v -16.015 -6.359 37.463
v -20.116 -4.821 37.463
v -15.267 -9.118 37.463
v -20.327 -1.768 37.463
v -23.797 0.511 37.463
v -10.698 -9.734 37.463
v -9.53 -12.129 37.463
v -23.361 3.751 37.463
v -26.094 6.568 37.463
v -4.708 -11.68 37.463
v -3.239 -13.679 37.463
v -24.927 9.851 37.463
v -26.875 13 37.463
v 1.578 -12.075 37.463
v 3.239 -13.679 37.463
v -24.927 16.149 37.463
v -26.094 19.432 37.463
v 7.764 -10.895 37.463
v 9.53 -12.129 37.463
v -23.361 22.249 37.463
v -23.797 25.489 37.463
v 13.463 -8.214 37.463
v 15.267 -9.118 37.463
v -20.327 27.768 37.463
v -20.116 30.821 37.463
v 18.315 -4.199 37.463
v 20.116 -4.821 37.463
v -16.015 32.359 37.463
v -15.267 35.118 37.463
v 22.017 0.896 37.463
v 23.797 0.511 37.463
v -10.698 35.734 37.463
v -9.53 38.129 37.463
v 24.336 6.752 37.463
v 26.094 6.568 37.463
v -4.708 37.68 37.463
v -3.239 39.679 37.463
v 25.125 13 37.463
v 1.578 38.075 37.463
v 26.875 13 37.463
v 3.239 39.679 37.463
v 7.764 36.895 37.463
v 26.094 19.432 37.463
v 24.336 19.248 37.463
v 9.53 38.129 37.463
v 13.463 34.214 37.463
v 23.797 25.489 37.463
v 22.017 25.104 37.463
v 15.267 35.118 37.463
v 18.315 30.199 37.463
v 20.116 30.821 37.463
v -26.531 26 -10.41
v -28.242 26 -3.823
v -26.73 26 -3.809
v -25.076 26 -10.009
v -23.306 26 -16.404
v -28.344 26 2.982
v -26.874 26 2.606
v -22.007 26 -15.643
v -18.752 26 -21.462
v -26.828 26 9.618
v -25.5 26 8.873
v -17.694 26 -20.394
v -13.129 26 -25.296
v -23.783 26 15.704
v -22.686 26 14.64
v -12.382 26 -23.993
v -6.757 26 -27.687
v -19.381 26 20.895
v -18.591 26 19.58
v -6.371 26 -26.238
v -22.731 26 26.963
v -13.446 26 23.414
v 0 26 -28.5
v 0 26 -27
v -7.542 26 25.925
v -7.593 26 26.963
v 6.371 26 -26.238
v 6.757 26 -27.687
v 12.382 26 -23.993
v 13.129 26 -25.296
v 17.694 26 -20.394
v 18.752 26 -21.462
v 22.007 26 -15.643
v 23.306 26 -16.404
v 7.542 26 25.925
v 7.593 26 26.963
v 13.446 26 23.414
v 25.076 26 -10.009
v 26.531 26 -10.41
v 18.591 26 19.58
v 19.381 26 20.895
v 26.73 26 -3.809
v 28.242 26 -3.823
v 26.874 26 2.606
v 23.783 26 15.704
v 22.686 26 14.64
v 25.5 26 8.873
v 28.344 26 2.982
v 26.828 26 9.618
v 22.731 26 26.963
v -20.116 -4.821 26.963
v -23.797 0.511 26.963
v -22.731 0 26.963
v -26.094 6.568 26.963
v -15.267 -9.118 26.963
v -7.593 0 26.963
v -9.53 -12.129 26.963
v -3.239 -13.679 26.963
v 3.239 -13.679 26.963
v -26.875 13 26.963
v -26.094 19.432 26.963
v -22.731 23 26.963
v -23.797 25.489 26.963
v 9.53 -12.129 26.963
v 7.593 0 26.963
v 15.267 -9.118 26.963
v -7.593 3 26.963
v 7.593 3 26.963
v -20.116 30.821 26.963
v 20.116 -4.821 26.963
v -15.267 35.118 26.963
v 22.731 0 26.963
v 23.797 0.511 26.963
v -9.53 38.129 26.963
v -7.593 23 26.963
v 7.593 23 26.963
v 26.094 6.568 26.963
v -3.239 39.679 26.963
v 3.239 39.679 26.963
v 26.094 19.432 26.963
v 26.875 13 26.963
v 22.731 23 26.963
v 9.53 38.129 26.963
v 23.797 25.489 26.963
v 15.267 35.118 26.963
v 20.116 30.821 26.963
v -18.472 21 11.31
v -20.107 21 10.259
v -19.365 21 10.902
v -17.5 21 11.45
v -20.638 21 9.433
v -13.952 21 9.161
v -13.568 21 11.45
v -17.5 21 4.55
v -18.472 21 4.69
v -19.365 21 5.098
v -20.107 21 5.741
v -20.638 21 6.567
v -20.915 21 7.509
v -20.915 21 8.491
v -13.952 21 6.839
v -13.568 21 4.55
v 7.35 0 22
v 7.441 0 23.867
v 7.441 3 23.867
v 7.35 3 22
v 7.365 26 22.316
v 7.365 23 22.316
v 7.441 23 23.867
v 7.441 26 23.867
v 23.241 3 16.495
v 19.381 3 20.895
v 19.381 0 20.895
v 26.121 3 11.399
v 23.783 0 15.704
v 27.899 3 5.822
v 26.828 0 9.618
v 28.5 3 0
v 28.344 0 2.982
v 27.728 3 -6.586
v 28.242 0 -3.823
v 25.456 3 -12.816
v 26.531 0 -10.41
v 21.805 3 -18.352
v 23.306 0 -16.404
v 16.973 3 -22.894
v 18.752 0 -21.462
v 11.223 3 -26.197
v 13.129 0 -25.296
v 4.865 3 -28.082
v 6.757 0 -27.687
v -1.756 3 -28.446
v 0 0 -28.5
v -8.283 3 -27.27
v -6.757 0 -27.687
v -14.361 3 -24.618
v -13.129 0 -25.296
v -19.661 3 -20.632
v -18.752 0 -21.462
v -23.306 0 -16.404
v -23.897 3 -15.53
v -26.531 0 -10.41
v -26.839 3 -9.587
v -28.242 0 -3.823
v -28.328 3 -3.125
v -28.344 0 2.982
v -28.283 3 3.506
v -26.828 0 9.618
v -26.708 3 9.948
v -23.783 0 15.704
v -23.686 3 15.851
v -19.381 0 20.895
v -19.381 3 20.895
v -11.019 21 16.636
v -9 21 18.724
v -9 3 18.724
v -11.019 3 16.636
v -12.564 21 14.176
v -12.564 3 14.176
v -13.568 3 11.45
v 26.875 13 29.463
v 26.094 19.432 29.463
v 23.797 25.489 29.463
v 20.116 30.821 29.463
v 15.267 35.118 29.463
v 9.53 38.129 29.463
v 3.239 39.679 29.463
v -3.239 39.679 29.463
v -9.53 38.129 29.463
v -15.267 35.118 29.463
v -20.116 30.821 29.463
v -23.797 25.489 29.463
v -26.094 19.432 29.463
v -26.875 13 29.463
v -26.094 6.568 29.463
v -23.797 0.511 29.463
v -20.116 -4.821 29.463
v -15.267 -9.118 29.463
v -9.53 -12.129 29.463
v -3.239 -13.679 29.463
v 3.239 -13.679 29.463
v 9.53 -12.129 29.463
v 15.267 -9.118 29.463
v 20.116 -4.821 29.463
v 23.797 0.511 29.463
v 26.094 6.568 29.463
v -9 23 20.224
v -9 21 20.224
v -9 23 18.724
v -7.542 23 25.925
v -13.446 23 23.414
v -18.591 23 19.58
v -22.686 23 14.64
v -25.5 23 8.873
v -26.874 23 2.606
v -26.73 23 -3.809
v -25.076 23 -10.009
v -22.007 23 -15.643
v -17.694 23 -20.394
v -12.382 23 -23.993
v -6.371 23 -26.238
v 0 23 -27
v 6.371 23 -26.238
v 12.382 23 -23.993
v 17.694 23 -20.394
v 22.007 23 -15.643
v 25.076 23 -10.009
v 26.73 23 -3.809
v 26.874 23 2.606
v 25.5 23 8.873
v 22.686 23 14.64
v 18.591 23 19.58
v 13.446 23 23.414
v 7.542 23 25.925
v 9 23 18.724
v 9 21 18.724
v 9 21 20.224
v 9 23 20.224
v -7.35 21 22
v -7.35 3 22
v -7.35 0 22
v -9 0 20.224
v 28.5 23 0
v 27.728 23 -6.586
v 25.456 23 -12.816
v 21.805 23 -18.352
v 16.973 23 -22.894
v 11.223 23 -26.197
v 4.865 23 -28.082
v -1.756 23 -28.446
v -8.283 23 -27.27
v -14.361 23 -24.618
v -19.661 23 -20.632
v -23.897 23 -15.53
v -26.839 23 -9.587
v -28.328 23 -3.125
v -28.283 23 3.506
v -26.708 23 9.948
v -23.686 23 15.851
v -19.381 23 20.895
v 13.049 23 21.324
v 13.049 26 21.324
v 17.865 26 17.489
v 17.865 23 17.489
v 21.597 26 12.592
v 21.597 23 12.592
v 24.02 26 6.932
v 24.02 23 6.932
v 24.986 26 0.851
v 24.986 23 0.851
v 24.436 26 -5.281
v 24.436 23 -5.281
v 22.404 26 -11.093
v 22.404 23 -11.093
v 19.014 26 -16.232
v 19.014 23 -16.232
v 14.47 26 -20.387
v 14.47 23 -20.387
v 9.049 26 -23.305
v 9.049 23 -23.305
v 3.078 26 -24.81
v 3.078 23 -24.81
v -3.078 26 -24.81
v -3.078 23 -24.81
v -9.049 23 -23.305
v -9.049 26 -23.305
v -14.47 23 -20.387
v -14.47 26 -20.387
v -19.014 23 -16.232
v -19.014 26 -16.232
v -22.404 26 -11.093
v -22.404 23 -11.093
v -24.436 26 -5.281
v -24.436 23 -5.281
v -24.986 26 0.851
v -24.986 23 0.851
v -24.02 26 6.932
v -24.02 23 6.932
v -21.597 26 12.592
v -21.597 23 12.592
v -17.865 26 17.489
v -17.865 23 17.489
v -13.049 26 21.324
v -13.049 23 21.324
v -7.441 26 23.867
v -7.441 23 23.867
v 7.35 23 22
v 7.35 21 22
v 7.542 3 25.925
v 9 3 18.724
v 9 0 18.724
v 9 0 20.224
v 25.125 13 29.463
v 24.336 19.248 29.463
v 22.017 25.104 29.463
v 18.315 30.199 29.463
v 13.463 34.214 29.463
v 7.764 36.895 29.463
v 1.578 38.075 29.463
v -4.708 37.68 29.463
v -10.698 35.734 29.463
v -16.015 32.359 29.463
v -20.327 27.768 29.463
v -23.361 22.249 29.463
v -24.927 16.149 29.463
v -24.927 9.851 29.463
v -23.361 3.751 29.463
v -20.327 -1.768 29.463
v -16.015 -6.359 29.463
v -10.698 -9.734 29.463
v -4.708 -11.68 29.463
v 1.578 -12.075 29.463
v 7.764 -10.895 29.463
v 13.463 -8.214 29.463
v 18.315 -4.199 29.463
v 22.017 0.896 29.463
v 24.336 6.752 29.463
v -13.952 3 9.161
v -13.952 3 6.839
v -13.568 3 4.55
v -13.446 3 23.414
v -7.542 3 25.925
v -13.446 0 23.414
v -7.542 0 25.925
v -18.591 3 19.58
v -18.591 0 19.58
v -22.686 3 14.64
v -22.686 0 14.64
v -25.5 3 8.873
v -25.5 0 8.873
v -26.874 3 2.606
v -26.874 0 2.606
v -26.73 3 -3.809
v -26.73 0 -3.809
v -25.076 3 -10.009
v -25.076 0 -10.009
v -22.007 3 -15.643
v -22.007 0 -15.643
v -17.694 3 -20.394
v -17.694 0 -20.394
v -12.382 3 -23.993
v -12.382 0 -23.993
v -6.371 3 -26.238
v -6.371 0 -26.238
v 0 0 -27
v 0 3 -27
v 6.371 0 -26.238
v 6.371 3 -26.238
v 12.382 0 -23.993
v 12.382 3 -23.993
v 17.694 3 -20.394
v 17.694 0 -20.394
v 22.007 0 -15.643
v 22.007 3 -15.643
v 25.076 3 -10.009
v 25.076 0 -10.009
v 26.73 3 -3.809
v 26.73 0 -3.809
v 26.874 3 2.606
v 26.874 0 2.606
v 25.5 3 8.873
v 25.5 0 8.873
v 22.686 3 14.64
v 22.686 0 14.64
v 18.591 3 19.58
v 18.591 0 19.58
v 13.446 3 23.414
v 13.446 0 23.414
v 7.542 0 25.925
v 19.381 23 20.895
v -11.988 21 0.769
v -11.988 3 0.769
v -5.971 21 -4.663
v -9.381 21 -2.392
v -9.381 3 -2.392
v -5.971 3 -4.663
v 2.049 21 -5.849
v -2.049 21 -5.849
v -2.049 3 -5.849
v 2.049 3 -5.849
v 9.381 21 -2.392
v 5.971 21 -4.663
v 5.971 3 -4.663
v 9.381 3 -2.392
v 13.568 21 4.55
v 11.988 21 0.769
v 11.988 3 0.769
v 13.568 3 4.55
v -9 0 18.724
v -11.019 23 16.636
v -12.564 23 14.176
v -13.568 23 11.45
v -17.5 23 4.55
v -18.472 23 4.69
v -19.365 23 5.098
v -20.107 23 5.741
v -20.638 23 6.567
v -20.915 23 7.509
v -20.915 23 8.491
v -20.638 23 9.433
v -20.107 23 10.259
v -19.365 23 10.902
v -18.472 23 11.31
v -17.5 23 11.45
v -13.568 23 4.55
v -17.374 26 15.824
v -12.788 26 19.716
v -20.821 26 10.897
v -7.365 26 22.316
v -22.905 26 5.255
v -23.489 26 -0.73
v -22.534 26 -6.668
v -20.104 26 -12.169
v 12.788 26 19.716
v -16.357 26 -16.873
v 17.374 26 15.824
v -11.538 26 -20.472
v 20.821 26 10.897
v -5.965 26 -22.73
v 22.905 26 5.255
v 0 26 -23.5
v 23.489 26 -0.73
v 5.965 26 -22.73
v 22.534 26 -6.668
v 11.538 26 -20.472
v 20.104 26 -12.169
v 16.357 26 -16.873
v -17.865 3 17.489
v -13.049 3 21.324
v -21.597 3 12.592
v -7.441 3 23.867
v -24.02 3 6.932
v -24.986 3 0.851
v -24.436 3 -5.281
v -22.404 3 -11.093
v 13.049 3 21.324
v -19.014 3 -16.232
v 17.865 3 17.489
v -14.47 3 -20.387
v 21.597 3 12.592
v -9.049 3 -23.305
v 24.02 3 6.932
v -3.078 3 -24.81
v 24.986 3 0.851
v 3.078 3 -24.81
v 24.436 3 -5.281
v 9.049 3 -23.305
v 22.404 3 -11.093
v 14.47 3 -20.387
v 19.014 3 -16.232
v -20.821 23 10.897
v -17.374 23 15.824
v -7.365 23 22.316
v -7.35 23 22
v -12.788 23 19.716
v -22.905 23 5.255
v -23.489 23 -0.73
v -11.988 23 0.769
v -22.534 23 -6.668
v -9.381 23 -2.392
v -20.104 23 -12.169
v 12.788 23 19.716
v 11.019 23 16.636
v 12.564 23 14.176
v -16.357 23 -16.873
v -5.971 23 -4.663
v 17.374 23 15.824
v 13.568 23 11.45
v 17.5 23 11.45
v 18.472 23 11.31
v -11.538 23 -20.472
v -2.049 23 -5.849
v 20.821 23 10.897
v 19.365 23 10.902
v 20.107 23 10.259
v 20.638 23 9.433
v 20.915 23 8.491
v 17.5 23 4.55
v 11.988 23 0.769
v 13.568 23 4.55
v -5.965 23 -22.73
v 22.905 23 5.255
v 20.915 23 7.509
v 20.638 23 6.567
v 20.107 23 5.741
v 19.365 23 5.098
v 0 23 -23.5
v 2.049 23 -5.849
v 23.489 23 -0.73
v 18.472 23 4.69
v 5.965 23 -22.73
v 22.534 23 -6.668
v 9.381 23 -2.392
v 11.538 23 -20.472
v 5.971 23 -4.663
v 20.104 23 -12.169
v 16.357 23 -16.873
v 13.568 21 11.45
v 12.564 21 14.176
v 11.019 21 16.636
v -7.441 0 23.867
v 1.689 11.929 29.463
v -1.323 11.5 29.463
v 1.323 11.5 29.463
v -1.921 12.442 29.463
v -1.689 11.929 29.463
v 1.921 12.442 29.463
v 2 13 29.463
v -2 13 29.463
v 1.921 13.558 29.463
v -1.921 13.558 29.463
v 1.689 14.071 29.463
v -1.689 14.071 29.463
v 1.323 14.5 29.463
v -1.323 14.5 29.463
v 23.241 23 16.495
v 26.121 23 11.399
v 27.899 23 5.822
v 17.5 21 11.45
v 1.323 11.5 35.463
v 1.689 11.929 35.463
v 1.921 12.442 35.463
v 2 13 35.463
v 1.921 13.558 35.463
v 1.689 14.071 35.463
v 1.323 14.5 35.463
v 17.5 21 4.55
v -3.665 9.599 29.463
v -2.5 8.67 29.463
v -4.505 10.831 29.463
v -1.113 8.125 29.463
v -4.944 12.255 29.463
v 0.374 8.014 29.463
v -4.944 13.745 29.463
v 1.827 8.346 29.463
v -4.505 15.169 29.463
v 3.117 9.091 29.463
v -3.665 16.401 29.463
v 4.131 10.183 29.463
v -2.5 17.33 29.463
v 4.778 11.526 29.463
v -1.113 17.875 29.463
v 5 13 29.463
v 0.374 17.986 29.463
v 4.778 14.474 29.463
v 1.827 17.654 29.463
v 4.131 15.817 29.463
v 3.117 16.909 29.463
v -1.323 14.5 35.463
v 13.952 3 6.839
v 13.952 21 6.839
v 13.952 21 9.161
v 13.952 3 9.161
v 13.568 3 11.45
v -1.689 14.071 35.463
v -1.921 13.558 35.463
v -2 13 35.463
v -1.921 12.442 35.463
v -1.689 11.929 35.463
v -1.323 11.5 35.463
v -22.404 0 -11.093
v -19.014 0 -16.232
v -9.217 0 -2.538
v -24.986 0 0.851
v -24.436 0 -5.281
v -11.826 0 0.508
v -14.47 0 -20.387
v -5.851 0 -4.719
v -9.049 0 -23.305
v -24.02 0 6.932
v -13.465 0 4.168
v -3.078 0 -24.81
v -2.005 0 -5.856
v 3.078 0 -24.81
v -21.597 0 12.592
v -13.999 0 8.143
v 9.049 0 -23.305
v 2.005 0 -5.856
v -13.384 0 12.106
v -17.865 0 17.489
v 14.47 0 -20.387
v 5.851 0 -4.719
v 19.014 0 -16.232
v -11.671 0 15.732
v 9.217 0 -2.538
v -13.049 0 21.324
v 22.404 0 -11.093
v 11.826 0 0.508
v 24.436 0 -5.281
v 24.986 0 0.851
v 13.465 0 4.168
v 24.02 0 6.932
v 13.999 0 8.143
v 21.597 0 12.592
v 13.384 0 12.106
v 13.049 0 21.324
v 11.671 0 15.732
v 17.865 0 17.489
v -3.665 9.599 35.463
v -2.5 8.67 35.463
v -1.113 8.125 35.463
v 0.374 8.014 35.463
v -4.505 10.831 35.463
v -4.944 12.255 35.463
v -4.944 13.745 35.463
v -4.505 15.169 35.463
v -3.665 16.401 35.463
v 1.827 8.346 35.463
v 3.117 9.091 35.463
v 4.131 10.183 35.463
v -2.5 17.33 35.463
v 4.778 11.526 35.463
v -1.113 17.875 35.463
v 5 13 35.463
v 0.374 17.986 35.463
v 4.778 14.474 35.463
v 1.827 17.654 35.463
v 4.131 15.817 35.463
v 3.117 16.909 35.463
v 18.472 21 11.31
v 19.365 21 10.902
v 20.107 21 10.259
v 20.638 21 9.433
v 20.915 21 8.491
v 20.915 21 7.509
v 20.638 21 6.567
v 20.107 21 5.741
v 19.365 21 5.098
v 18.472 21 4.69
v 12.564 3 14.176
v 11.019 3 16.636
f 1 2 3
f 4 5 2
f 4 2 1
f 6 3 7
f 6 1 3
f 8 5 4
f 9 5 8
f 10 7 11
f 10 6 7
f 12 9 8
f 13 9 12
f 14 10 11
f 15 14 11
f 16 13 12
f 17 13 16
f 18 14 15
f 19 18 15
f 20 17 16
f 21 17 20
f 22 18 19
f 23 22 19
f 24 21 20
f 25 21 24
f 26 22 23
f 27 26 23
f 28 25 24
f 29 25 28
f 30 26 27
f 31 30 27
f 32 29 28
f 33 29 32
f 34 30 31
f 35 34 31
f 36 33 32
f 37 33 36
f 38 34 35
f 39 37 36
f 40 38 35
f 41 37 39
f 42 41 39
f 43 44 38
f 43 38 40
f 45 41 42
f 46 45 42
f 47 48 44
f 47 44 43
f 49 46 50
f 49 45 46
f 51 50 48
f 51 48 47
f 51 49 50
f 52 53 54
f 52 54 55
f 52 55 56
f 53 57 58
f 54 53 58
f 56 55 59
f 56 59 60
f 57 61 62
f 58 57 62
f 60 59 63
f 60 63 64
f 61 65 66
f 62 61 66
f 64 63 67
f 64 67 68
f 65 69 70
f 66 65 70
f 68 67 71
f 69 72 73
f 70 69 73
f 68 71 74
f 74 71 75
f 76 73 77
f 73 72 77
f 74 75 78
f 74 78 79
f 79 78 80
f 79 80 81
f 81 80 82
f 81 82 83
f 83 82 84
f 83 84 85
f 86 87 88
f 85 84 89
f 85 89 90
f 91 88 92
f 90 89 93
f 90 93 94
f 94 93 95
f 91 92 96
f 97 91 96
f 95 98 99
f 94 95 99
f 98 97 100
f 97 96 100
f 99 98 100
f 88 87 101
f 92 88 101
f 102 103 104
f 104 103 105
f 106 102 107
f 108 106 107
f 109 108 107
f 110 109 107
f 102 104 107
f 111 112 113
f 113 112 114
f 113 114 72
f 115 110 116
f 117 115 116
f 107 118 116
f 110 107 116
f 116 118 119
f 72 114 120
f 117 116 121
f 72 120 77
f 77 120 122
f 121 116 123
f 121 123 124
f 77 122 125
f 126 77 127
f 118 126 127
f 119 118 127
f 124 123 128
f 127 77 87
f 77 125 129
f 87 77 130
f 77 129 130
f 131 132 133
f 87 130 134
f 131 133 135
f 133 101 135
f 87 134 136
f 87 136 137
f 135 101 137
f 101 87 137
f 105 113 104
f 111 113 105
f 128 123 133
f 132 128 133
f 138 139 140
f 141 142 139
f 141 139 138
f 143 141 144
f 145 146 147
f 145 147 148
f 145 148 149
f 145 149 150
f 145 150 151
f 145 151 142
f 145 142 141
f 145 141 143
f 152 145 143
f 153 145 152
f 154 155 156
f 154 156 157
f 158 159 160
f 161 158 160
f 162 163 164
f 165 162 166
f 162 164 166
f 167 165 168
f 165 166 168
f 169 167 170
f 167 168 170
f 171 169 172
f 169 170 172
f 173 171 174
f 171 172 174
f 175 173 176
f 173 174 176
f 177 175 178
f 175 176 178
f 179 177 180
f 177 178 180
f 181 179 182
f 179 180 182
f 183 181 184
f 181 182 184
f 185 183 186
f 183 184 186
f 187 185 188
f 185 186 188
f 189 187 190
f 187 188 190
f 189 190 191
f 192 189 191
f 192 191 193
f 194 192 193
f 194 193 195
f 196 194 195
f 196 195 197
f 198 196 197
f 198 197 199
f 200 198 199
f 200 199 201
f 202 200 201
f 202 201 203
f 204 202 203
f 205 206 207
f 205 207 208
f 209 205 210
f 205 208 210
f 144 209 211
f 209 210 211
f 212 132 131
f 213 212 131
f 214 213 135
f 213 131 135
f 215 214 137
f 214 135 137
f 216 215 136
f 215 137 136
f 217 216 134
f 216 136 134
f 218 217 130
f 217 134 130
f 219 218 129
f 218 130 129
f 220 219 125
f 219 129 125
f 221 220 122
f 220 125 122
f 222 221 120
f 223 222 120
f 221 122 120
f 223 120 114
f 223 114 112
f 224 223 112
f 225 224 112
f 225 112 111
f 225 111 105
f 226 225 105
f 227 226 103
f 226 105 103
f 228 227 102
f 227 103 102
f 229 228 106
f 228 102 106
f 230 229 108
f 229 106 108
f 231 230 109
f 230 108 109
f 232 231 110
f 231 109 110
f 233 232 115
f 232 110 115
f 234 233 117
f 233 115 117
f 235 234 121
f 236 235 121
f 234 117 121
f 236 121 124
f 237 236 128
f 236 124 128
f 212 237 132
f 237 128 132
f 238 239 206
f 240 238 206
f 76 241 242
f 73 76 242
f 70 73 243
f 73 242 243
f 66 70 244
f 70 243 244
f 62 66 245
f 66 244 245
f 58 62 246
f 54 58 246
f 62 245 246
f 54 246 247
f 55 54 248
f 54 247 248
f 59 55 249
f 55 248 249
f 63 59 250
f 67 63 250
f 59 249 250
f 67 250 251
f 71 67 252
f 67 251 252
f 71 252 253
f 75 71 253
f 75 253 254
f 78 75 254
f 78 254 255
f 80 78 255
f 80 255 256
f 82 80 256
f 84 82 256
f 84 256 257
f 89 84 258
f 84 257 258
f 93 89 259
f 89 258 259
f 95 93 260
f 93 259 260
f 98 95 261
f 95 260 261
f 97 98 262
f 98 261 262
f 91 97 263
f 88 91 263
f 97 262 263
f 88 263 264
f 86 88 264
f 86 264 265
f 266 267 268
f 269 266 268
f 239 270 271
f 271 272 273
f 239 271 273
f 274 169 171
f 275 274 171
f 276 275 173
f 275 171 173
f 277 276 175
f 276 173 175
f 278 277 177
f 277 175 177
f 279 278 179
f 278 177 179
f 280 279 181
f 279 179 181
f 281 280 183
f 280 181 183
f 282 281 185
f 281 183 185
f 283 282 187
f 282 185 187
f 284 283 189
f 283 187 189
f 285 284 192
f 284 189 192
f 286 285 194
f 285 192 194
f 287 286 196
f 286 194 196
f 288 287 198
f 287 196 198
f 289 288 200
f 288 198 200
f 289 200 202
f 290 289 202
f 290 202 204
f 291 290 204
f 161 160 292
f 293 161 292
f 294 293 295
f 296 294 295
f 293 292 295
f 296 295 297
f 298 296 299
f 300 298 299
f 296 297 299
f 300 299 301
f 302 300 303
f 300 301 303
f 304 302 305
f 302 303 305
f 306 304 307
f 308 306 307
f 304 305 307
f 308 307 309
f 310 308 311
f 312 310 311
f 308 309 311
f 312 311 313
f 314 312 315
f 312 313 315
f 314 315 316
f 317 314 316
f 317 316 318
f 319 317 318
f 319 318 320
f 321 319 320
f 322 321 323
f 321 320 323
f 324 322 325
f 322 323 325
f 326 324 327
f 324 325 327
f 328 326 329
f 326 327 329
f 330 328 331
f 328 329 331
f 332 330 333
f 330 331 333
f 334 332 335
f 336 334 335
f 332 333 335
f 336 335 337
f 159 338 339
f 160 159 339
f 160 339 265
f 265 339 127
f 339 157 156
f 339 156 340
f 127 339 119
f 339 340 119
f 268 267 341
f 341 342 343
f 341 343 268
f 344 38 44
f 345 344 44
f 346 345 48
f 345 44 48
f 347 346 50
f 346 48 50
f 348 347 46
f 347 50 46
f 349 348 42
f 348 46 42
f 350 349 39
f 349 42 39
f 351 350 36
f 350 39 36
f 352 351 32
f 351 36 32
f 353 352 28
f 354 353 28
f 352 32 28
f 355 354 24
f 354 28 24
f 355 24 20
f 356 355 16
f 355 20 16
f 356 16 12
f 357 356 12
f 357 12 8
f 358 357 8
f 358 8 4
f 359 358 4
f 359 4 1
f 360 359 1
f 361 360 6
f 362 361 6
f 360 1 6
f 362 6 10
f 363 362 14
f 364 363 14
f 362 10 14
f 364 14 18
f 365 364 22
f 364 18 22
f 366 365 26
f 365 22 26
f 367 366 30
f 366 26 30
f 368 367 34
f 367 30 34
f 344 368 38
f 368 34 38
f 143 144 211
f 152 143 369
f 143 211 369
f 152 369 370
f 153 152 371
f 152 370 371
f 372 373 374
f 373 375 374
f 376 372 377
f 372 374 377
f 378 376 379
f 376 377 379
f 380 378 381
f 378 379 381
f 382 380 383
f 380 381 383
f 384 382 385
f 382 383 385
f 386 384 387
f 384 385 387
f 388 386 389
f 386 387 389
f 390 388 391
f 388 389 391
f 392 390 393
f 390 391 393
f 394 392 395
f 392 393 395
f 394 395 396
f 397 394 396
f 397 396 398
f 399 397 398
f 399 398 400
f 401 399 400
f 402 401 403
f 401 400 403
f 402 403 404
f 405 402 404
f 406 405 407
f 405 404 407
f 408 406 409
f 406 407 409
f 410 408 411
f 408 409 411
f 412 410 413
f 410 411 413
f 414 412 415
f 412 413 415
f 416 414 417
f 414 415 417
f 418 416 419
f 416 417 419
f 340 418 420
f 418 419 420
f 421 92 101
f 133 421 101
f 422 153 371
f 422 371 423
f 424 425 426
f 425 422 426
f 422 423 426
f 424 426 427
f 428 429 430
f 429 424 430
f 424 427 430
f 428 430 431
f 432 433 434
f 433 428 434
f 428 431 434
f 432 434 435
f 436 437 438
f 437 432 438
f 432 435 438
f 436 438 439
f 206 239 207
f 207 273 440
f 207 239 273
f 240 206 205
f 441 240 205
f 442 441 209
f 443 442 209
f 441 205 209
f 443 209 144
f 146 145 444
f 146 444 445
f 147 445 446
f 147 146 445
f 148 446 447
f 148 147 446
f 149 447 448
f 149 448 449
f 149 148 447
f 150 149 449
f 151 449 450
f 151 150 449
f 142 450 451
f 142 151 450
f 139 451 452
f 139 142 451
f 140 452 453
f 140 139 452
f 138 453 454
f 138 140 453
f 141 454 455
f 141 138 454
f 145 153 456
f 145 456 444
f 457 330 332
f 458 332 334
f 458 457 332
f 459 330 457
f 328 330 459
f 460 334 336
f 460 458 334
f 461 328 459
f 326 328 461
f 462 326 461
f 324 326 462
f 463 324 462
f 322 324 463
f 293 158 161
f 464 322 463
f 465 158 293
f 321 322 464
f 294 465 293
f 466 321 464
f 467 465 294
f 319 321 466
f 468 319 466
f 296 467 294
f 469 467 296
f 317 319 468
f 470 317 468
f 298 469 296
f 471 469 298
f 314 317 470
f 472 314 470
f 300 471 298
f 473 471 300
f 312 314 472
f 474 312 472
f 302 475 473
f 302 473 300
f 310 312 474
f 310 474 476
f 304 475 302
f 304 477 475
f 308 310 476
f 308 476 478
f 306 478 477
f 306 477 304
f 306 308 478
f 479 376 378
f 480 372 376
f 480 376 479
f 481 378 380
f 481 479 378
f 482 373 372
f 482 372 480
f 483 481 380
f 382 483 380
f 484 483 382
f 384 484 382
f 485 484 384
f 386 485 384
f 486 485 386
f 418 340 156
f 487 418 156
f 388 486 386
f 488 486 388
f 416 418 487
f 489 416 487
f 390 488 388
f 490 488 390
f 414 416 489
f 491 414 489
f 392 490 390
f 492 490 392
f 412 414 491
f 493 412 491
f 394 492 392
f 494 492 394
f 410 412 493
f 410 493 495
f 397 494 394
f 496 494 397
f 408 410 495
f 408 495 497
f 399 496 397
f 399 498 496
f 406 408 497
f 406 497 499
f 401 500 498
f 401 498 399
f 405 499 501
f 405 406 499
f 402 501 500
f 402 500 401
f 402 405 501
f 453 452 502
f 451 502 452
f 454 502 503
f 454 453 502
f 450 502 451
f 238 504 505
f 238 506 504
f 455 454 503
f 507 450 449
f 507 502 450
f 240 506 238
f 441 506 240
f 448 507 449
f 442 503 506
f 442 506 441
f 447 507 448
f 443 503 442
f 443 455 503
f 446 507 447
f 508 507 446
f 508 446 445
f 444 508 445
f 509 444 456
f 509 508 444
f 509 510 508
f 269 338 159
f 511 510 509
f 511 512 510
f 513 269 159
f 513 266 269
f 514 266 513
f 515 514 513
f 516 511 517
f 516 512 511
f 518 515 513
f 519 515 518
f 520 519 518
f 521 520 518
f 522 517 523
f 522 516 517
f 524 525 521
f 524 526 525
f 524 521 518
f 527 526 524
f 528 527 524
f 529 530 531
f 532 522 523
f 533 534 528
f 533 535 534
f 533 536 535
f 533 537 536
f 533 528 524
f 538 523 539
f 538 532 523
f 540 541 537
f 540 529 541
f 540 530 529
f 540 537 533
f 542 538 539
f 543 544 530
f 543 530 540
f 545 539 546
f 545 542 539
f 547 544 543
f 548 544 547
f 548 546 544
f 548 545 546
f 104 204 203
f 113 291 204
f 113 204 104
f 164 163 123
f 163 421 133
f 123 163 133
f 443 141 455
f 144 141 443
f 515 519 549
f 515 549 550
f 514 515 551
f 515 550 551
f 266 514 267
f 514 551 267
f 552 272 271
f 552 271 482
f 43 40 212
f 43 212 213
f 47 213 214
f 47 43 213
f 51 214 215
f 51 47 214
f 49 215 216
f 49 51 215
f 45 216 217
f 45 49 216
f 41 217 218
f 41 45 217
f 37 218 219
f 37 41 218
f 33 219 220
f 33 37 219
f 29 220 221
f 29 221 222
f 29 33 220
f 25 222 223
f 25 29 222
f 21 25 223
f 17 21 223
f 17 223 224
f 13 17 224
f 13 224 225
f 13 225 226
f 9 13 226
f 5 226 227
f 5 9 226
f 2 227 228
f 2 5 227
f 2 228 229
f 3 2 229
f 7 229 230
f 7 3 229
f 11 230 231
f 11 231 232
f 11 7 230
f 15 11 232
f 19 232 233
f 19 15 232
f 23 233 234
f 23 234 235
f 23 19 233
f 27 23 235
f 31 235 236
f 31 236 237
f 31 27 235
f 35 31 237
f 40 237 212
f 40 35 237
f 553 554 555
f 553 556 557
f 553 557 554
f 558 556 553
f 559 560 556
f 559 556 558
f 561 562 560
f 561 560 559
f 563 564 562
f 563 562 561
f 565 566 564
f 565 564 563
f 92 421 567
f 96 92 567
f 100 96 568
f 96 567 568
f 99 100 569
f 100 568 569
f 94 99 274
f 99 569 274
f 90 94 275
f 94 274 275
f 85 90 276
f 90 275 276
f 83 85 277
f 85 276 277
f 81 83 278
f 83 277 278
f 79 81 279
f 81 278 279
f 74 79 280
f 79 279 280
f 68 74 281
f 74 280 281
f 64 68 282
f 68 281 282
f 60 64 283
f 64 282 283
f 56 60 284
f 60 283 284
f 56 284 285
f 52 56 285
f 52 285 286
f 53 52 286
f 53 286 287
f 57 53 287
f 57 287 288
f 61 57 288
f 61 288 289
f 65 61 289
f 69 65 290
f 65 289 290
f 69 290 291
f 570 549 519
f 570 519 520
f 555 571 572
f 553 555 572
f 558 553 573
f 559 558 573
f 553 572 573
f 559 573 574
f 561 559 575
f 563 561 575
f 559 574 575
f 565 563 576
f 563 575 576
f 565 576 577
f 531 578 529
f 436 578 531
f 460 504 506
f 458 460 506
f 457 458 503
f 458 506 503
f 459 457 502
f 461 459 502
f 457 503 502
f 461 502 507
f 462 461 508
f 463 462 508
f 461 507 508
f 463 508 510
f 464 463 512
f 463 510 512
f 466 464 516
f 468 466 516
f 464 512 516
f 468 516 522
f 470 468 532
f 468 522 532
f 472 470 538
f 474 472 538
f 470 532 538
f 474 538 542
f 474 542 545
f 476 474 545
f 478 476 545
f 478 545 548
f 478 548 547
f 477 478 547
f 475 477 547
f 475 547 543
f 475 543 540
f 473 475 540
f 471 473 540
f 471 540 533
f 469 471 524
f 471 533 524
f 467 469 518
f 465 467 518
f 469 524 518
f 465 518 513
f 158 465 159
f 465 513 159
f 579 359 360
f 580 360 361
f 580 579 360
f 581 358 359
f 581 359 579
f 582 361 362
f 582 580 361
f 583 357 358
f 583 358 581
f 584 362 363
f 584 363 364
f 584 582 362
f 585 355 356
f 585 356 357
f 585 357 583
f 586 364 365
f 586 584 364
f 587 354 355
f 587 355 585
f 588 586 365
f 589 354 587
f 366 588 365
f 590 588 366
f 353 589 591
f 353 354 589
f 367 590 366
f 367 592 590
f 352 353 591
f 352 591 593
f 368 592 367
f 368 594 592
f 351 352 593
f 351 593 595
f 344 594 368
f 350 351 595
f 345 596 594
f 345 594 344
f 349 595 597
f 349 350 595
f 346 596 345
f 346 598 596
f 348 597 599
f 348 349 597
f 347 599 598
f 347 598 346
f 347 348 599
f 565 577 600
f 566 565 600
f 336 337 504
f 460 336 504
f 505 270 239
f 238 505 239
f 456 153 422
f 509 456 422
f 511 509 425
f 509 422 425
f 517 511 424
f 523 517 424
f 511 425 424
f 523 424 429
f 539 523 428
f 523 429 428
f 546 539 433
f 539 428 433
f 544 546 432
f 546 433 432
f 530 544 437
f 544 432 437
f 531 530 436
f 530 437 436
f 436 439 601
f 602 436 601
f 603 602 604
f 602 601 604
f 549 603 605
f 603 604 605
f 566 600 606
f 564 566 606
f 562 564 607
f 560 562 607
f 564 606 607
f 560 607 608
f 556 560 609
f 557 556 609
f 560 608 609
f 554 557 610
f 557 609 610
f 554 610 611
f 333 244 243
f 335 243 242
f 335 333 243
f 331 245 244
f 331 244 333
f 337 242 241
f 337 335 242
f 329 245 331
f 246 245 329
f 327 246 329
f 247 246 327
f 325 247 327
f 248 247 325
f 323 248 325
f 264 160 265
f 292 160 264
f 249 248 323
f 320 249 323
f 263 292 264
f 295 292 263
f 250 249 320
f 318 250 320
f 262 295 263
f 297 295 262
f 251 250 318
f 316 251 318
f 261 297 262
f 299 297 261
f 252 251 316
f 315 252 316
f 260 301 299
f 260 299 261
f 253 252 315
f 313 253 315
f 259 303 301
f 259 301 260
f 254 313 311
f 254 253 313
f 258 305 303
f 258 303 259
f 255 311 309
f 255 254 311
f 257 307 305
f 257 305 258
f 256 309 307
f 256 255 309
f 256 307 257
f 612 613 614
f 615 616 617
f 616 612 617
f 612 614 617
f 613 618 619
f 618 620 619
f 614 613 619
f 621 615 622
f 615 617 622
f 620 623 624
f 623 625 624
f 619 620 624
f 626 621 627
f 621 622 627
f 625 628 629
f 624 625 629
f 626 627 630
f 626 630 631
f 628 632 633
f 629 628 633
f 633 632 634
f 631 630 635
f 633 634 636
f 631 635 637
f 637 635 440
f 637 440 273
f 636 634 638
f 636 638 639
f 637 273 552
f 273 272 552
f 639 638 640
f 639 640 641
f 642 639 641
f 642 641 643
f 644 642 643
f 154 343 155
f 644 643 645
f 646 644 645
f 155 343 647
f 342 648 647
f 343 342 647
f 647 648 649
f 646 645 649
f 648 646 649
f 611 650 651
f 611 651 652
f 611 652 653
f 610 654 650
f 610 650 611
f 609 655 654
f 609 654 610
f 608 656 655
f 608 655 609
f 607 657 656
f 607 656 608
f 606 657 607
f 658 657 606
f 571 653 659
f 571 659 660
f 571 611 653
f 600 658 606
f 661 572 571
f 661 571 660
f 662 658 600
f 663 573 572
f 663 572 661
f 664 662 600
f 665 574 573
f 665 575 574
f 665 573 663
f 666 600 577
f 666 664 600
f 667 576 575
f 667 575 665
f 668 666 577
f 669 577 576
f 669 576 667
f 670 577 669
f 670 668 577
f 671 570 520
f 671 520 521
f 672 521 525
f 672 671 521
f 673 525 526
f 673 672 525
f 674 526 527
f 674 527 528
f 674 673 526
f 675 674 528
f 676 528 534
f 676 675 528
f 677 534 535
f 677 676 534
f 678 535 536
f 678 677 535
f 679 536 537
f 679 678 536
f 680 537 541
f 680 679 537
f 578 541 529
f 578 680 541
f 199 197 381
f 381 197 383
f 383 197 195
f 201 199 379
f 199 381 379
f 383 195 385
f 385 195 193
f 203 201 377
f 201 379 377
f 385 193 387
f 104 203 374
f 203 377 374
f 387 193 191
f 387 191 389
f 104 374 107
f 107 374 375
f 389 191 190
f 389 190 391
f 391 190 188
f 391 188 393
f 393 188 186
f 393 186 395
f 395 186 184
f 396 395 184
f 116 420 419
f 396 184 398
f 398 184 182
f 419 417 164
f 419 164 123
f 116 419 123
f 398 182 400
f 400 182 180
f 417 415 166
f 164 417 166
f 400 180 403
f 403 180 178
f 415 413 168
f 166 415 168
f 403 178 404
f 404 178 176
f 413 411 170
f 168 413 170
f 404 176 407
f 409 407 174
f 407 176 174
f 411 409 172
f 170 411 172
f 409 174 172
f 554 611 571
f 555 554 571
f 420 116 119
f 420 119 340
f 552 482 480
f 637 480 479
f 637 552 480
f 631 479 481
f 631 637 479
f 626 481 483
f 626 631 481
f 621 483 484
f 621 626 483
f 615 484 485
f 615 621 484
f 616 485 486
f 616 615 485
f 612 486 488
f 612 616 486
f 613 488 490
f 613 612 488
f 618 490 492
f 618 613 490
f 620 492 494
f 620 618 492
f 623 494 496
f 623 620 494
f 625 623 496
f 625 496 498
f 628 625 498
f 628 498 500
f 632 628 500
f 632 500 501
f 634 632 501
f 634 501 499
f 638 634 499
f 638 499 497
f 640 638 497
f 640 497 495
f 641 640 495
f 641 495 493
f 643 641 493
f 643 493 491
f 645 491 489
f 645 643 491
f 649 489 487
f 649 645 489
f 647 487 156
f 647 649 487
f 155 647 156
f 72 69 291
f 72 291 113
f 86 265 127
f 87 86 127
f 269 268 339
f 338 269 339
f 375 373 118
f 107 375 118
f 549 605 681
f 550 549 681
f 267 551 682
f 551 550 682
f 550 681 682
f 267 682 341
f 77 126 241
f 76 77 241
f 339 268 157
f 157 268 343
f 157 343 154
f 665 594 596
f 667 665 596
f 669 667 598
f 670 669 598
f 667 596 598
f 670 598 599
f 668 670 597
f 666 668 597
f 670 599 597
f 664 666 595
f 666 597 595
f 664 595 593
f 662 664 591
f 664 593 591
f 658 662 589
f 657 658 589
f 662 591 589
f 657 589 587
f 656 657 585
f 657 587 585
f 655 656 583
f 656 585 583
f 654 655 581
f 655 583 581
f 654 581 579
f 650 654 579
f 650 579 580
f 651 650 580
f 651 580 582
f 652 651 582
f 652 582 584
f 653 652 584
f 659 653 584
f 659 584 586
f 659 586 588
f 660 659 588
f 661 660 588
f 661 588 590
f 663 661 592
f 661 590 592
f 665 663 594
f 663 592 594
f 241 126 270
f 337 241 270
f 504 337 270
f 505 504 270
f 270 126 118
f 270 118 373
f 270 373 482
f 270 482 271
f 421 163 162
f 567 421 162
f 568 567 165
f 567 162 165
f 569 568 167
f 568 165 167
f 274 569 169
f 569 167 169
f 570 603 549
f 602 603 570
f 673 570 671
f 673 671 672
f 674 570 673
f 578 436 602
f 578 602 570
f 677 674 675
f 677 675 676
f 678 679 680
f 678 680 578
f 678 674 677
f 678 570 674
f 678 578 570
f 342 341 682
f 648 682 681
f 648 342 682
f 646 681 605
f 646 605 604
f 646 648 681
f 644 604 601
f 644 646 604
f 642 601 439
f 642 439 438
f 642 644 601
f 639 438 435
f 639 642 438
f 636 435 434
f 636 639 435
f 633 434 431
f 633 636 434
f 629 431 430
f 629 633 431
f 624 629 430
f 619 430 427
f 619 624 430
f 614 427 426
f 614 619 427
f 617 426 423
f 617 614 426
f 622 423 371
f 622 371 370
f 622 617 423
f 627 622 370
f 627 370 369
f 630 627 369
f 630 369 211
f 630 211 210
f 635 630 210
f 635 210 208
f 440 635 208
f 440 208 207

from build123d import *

# Parameters (mm, degrees)
SKETCH1_R                = 28.5
BOSS_EXTRUDE1_DEPTH      = 3
BOSS_EXTRUDE4_DEPTH      = 20
BOSS_EXTRUDE7_DEPTH      = 3
SKETCH7_R                = 27
SKETCH7_R_2              = 25
CUT_EXTRUDE1_DEPTH       = 3
CUT_EXTRUDE2_START       = -5
CUT_EXTRUDE2_DEPTH       = 5
CUT_EXTRUDE3_START       = -5
CUT_EXTRUDE3_DEPTH       = 5
BOSS_EXTRUDE8_DEPTH      = 2
BOSS_EXTRUDE8_DEPTH_BACK = 0.5
SKETCH10_R               = 26.875
CHAMFER1_SIZE            = 13.49895933
BOSS_EXTRUDE9_START      = 8
SKETCH11_R               = 26.875
SKETCH11_R_2             = 25.125
BOSS_EXTRUDE9_DEPTH      = 8
CUT_EXTRUDE4_START       = -2
CUT_EXTRUDE4_DEPTH       = 2
SKETCH12_R               = 5
BOSS_EXTRUDE10_DEPTH     = 6
CUT_EXTRUDE5_DEPTH       = 6


with BuildPart() as part:
    # Sketch1 → Boss-Extrude1 (new body)
    with BuildSketch(Plane(origin=(0, 0, 0), x_dir=(1, 0, 0), z_dir=(0, 1, 0))):
        with Locations(Location((0, 0, 0), (0, 0, 270))):
            Circle(SKETCH1_R)
    extrude(amount=BOSS_EXTRUDE1_DEPTH)

    # Sketch2 → Boss-Extrude4 (add)
    with BuildSketch(Plane(origin=(0, 3, 0), x_dir=(1, 0, 0), z_dir=(0, 1, 0))):
        with BuildLine():
            Line((-9, -20.223805295), (-9, -18.723805295))
            ThreePointArc((-9, -18.723805295), (-11.855740218, -15.445899804), (-13.568253388, -11.45))
            ThreePointArc((-13.568253388, -11.45), (-14, -8), (-13.568253388, -4.55))
            ThreePointArc((-13.568253388, -4.55), (0, 6), (13.568253388, -4.55))
            ThreePointArc((13.568253388, -4.55), (14, -8), (13.568253388, -11.45))
            ThreePointArc((13.568253388, -11.45), (11.855740218, -15.445899804), (9, -18.723805295))
            Line((9, -18.723805295), (9, -20.223805295))
            Line((9, -20.223805295), (7.35, -22))
            Line((7.35, -22), (7.617272727, -27.463196394))
            ThreePointArc((7.617272727, -27.463196394), (22.686364547, -17.250474302), (28.5, 0))
            ThreePointArc((28.5, 0), (-17.250474302, 22.686364547), (-7.617272727, -27.463196394))
            Line((-7.617272727, -27.463196394), (-7.35, -22))
            Line((-7.35, -22), (-9, -20.223805295))
        make_face()
    extrude(amount=BOSS_EXTRUDE4_DEPTH)

    # Boss-Extrude7: read off the stored shape, not the designer's step
    # Boss-Extrude7 outline → Boss-Extrude7 (add)
    with BuildSketch(Plane(origin=(0, 23, 0), x_dir=(1, 0, 0), z_dir=(0, 1, 0))):
        with BuildLine():
            ThreePointArc((7.617272727, -27.463196394), (0, 28.5), (-7.617272727, -27.463196394))
            Line((-7.617272727, -27.463196394), (-7.542031899, -25.92523394))
            ThreePointArc((-7.542031899, -25.92523394), (0, 27), (7.542031899, -25.92523394))
            Line((7.542031899, -25.92523394), (7.617272727, -27.463196394))
        make_face()
        with BuildLine():
            ThreePointArc((7.441330866, -23.866851383), (0, 25), (-7.441330866, -23.866851383))
            Line((-7.441330866, -23.866851383), (-7.365455329, -22.315915124))
            ThreePointArc((-7.365455329, -22.315915124), (0, 23.5), (7.365455329, -22.315915124))
            Line((7.365455329, -22.315915124), (7.441330866, -23.866851383))
        make_face()
    extrude(amount=BOSS_EXTRUDE7_DEPTH)

    # Sketch7 → Cut-Extrude1 (cut)
    with BuildSketch(Plane.XZ):
        with Locations(Location((0, 0, 0), (0, 0, 270))):
            Circle(SKETCH7_R)
        with Locations(Location((0, 0, 0), (0, 0, 270))):
            Circle(SKETCH7_R_2, mode=Mode.SUBTRACT)
    extrude(amount=-CUT_EXTRUDE1_DEPTH, mode=Mode.SUBTRACT)

    # Sketch8 → Cut-Extrude2 (cut)
    with BuildSketch(Plane(origin=(0, 3, 0), x_dir=(1, 0, 0), z_dir=(0, 1, 0)).offset(CUT_EXTRUDE2_START)):
        with BuildLine():
            Line((-7.542031899, -25.92523394), (-7.617272727, -27.463196394))
            ThreePointArc((-7.617272727, -27.463196394), (0, -28.5), (7.617272727, -27.463196394))
            Line((7.617272727, -27.463196394), (7.542031899, -25.92523394))
            ThreePointArc((7.542031899, -25.92523394), (0, -27), (-7.542031899, -25.92523394))
        make_face()
    extrude(amount=CUT_EXTRUDE2_DEPTH, mode=Mode.SUBTRACT)

    # Sketch9 → Cut-Extrude3 (cut)
    with BuildSketch(Plane(origin=(0, 3, 0), x_dir=(1, 0, 0), z_dir=(0, 1, 0)).offset(CUT_EXTRUDE3_START)):
        with BuildLine():
            Line((-7.35, -22), (-7.441330866, -23.866851383))
            ThreePointArc((-7.441330866, -23.866851383), (0, -25), (7.441330866, -23.866851383))
            Line((7.441330866, -23.866851383), (7.35, -22))
            Line((7.35, -22), (9, -20.223805295))
            Line((9, -20.223805295), (9, -18.723805295))
            ThreePointArc((9, -18.723805295), (0, 6), (-9, -18.723805295))
            Line((-9, -18.723805295), (-9, -20.223805295))
            Line((-9, -20.223805295), (-7.35, -22))
        make_face()
    extrude(amount=CUT_EXTRUDE3_DEPTH, mode=Mode.SUBTRACT)

    # Sketch10 → Boss-Extrude8 (add, two sides: drawn at the far end of the back side and taken through both)
    with BuildSketch(Plane.XY.offset(27.463196394).offset(-BOSS_EXTRUDE8_DEPTH_BACK)):
        with Locations((0, 13)):
            Circle(SKETCH10_R)
    extrude(amount=BOSS_EXTRUDE8_DEPTH + BOSS_EXTRUDE8_DEPTH_BACK)

    # Chamfer1
    # the kernel refuses this chamfer: 13.49895933, 12 mm, written as the material it adds along each edge
    with BuildSketch(Plane(origin=(9.23233666, 23, 26.963196394), x_dir=(0.8582935658681564, 0, -0.5131589956235051), z_dir=(0, -1, 0))) as chamfer1_piece_1:
        with BuildLine():
            Line((11.824703255, 0), (CHAMFER1_SIZE * 0.85829356586, CHAMFER1_SIZE * 0.513158995619))
            Line((CHAMFER1_SIZE * 0.85829356586, CHAMFER1_SIZE * 0.513158995619), (0, 0))
            ThreePointArc((0, 0), (5.921946236, 0.620003797), (11.824703255, 0))
        make_face()
    extrude(amount=23)
    with BuildSketch(Plane(origin=(-9.23233666, 23, 26.963196394), x_dir=(-0.8582935658681565, 0, -0.5131589956235051), z_dir=(0, -1, 0))) as chamfer1_piece_2:
        with BuildLine():
            Line((11.824703255, 0), (CHAMFER1_SIZE * 0.85829356586, -CHAMFER1_SIZE * 0.513158995619))
            Line((CHAMFER1_SIZE * 0.85829356586, -CHAMFER1_SIZE * 0.513158995619), (0, 0))
            ThreePointArc((0, 0), (5.921946236, -0.620003797), (11.824703255, 0))
        make_face()
    extrude(amount=23)
    with BuildSketch(Plane(origin=(-9.232336658, 26, 26.963196394), x_dir=(-0.8582935658951355, 0, -0.5131589955783807), z_dir=(0, -1, 0))) as chamfer1_piece_3:
        with BuildLine():
            Line((11.824703255, 0), (CHAMFER1_SIZE * 0.858293565887, -CHAMFER1_SIZE * 0.513158995574))
            Line((CHAMFER1_SIZE * 0.858293565887, -CHAMFER1_SIZE * 0.513158995574), (0, 0))
            ThreePointArc((0, 0), (5.921946236, -0.620003797), (11.824703255, 0))
        make_face()
    extrude(amount=3)
    with BuildSketch(Plane(origin=(9.232336658, 26, 26.963196394), x_dir=(0.8582935658951357, 0, -0.5131589955783805), z_dir=(0, -1, 0))) as chamfer1_piece_4:
        with BuildLine():
            Line((11.824703255, 0), (CHAMFER1_SIZE * 0.858293565887, CHAMFER1_SIZE * 0.513158995574))
            Line((CHAMFER1_SIZE * 0.858293565887, CHAMFER1_SIZE * 0.513158995574), (0, 0))
            ThreePointArc((0, 0), (5.921946236, 0.620003797), (11.824703255, 0))
        make_face()
    extrude(amount=3)

    # Sketch11 → Boss-Extrude9 (add)
    with BuildSketch(Plane.XY.offset(29.463196394).offset(BOSS_EXTRUDE9_START)):
        with Locations((0, 13)):
            Circle(SKETCH11_R)
        with Locations((0, 13)):
            Circle(SKETCH11_R_2, mode=Mode.SUBTRACT)
    extrude(amount=-BOSS_EXTRUDE9_DEPTH)

    # Sketch13 → Cut-Extrude4 (cut)
    with BuildSketch(Plane(origin=(0, 23, 0), x_dir=(1, 0, 0), z_dir=(0, 1, 0)).offset(CUT_EXTRUDE4_START)):
        with BuildLine():
            Line((13.568253388, -11.45), (17.5, -11.45))
            ThreePointArc((17.5, -11.45), (20.95, -8), (17.5, -4.55))
            Line((17.5, -4.55), (13.568253388, -4.55))
            ThreePointArc((13.568253388, -4.55), (0, 6), (-13.568253388, -4.55))
            Line((-13.568253388, -4.55), (-17.5, -4.55))
            ThreePointArc((-17.5, -4.55), (-20.95, -8), (-17.5, -11.45))
            Line((-17.5, -11.45), (-13.568253388, -11.45))
            ThreePointArc((-13.568253388, -11.45), (-11.855740218, -15.445899804), (-9, -18.723805295))
            Line((-9, -18.723805295), (-9, -20.223805295))
            Line((-9, -20.223805295), (-7.35, -22))
            Line((-7.35, -22), (-7.35, -25))
            Line((-7.35, -25), (7.35, -25))
            Line((7.35, -25), (7.35, -22))
            Line((7.35, -22), (9, -20.223805295))
            Line((9, -20.223805295), (9, -18.723805295))
            ThreePointArc((9, -18.723805295), (11.855740218, -15.445899804), (13.568253388, -11.45))
        make_face()
    extrude(amount=CUT_EXTRUDE4_DEPTH, mode=Mode.SUBTRACT)

    # Sketch12 → Boss-Extrude10 (add)
    with BuildSketch(Plane.XY.offset(29.463196394)):
        with Locations((0, 13)):
            Circle(SKETCH12_R)
    extrude(amount=BOSS_EXTRUDE10_DEPTH)

    # Sketch14 → Cut-Extrude5 (cut)
    with BuildSketch(Plane.XY.offset(35.463196394)):
        with BuildLine():
            Line((-1.322875656, 11.5), (1.322875656, 11.5))
            ThreePointArc((1.322875656, 11.5), (2, 13), (1.322875656, 14.5))
            Line((1.322875656, 14.5), (-1.322875656, 14.5))
            ThreePointArc((-1.322875656, 14.5), (-2, 13), (-1.322875656, 11.5))
        make_face()
    extrude(amount=-CUT_EXTRUDE5_DEPTH, mode=Mode.SUBTRACT)


solid = part.part
